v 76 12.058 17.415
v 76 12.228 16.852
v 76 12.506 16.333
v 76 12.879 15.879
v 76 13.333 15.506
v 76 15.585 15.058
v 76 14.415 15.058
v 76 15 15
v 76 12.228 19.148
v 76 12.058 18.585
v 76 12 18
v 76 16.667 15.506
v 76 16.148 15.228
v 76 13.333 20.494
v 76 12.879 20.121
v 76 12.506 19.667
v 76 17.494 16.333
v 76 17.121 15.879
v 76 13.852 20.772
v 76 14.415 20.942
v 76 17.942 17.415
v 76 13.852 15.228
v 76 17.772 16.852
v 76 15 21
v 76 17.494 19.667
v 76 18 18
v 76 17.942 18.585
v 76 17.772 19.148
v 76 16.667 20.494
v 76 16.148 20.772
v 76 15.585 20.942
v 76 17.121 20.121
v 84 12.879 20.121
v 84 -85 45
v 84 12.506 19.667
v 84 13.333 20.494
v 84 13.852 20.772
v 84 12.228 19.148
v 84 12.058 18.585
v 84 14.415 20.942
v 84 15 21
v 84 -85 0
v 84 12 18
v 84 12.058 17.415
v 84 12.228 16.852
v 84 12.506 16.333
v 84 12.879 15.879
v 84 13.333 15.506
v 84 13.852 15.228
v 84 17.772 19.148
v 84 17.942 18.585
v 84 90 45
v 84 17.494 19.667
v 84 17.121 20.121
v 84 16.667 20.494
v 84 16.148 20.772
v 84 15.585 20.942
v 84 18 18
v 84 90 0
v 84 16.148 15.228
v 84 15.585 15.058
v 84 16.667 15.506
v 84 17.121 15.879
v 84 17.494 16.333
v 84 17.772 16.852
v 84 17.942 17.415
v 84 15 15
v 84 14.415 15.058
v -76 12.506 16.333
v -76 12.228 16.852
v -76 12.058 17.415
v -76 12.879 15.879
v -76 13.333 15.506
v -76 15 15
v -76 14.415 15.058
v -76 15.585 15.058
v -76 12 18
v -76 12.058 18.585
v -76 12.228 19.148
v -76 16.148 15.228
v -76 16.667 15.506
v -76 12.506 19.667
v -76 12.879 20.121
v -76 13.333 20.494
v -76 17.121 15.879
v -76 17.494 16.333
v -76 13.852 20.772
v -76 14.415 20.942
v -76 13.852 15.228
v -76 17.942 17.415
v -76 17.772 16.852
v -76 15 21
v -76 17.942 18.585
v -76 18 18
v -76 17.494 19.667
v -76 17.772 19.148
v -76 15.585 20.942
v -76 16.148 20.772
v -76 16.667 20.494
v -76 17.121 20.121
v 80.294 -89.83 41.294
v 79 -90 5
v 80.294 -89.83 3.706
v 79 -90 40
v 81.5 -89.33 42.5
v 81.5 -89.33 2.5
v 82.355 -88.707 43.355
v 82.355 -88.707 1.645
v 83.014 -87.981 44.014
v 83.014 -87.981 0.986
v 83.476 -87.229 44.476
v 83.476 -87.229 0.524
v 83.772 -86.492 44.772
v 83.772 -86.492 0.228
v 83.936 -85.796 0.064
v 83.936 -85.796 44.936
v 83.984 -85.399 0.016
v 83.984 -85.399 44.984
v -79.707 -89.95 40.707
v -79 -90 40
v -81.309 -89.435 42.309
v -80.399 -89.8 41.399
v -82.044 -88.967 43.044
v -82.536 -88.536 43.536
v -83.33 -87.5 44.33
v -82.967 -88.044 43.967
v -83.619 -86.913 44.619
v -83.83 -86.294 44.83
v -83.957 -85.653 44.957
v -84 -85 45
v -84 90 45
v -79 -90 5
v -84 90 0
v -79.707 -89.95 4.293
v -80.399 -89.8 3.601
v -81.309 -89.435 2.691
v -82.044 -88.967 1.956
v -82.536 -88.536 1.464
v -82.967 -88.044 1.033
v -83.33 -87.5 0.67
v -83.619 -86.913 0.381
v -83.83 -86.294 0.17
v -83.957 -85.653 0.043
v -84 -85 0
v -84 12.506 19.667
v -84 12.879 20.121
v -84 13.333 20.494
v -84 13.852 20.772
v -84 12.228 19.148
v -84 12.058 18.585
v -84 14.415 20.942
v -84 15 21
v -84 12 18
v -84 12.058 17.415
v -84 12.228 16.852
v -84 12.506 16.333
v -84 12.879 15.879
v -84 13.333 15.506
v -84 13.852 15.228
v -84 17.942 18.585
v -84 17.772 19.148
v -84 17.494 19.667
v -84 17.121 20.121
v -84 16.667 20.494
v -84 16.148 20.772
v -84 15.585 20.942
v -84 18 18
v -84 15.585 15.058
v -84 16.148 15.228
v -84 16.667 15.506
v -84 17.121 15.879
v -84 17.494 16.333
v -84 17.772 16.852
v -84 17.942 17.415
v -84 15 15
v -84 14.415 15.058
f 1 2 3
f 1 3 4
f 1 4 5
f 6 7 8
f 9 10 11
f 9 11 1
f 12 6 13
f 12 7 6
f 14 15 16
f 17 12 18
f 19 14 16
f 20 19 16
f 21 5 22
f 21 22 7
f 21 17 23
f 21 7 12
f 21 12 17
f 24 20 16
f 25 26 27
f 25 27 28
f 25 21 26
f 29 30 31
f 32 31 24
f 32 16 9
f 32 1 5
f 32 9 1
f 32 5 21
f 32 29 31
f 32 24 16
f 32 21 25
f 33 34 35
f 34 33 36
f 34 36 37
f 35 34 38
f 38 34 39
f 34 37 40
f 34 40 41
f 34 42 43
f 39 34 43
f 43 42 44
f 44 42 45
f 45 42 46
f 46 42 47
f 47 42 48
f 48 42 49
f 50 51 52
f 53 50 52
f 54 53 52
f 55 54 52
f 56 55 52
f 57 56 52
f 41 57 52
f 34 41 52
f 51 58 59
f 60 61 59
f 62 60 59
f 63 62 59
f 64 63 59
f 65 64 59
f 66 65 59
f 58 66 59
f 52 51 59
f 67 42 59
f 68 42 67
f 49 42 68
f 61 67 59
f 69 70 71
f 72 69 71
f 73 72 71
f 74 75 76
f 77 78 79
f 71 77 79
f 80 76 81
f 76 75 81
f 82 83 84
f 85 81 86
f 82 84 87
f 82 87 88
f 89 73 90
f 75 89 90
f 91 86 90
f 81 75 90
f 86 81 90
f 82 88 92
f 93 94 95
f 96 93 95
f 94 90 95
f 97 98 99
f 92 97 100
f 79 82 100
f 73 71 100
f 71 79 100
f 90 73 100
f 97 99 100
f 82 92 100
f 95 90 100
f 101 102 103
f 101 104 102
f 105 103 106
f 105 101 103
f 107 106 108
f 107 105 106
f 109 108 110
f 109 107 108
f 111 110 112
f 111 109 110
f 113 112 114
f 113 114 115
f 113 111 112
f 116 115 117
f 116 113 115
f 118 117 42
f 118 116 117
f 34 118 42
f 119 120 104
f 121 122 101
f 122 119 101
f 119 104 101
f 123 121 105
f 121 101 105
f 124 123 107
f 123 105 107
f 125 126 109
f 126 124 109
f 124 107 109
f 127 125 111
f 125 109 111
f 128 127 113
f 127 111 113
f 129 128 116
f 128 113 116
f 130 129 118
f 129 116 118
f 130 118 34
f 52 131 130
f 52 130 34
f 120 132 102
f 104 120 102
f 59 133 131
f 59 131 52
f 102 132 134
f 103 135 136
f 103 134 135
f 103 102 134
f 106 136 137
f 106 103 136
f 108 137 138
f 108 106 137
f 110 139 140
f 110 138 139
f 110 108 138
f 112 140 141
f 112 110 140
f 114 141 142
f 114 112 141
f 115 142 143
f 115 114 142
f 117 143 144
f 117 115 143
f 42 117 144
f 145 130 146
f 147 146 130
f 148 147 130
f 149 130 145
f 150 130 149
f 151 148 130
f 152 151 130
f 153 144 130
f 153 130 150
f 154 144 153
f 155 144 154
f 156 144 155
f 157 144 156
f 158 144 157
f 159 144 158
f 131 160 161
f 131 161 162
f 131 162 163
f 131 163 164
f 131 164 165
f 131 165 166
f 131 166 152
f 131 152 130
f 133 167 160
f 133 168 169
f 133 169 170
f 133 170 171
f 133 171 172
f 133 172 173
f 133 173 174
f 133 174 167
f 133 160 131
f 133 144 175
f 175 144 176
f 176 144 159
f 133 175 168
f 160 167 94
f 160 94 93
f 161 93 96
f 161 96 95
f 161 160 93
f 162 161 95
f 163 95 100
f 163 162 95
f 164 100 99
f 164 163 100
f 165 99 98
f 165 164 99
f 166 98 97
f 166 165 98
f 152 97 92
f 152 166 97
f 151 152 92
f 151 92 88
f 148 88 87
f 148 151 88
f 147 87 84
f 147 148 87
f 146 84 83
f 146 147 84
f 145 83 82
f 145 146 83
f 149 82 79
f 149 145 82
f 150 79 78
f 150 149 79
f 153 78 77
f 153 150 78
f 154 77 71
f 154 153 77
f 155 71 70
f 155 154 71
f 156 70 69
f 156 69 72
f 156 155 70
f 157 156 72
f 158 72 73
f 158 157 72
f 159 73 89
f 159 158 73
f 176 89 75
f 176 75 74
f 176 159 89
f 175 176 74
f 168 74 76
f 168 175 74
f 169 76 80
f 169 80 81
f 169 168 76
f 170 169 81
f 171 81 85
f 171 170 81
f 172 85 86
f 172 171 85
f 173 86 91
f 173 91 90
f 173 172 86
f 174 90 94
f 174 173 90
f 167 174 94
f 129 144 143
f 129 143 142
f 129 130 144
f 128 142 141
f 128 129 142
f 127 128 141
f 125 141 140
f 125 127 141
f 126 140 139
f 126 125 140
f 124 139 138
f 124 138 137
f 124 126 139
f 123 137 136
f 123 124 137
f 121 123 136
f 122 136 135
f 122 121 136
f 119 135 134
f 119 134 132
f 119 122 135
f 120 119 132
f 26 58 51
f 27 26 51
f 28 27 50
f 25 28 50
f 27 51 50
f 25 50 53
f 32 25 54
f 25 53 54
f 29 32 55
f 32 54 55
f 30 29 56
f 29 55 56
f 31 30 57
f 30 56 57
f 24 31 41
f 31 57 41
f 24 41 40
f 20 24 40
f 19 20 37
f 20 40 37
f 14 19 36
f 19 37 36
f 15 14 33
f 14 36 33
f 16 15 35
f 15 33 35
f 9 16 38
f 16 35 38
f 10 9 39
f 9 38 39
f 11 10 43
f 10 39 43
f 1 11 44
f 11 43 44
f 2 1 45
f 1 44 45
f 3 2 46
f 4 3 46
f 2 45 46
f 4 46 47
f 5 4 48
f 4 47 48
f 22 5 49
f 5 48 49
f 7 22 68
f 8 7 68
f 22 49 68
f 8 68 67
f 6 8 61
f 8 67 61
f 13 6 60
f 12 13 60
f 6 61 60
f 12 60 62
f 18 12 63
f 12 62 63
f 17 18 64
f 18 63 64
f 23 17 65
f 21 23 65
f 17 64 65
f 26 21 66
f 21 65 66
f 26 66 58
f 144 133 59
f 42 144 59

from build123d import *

# Parameters (mm, degrees)
SKETCH004_W     = 168
SKETCH004_H     = 180
PAD002_DEPTH    = 45
SKETCH005_R     = 3
POCKET002_DEPTH = 8
FILLET001_R     = 5


with BuildPart() as part:
    # Sketch004 → Pad002 (new body)
    with BuildSketch(Plane.XY):
        Rectangle(SKETCH004_W, SKETCH004_H)
    extrude(amount=PAD002_DEPTH)

    # Sketch005 (on Face2 of Pad002) → Pocket002 (cut)
    with BuildSketch(Plane.YZ.offset(84)):
        with Locations((15, 18)):
            Circle(SKETCH005_R)
    pocket002 = extrude(amount=-POCKET002_DEPTH, mode=Mode.SUBTRACT)

    # Mirrored: Pocket002 across YZ
    add(pocket002.mirror(Plane.YZ), mode=Mode.SUBTRACT)

    # Fillet001
    fillet001_edges = [part.edges().sort_by_distance(p)[0] for p in [
        (84, -90, 22.5),
        (-84, -90, 22.5),
        (0, -90, 0),
        (0, -90, 45),
    ]]
    fillet(fillet001_edges, radius=FILLET001_R)


solid = part.part
